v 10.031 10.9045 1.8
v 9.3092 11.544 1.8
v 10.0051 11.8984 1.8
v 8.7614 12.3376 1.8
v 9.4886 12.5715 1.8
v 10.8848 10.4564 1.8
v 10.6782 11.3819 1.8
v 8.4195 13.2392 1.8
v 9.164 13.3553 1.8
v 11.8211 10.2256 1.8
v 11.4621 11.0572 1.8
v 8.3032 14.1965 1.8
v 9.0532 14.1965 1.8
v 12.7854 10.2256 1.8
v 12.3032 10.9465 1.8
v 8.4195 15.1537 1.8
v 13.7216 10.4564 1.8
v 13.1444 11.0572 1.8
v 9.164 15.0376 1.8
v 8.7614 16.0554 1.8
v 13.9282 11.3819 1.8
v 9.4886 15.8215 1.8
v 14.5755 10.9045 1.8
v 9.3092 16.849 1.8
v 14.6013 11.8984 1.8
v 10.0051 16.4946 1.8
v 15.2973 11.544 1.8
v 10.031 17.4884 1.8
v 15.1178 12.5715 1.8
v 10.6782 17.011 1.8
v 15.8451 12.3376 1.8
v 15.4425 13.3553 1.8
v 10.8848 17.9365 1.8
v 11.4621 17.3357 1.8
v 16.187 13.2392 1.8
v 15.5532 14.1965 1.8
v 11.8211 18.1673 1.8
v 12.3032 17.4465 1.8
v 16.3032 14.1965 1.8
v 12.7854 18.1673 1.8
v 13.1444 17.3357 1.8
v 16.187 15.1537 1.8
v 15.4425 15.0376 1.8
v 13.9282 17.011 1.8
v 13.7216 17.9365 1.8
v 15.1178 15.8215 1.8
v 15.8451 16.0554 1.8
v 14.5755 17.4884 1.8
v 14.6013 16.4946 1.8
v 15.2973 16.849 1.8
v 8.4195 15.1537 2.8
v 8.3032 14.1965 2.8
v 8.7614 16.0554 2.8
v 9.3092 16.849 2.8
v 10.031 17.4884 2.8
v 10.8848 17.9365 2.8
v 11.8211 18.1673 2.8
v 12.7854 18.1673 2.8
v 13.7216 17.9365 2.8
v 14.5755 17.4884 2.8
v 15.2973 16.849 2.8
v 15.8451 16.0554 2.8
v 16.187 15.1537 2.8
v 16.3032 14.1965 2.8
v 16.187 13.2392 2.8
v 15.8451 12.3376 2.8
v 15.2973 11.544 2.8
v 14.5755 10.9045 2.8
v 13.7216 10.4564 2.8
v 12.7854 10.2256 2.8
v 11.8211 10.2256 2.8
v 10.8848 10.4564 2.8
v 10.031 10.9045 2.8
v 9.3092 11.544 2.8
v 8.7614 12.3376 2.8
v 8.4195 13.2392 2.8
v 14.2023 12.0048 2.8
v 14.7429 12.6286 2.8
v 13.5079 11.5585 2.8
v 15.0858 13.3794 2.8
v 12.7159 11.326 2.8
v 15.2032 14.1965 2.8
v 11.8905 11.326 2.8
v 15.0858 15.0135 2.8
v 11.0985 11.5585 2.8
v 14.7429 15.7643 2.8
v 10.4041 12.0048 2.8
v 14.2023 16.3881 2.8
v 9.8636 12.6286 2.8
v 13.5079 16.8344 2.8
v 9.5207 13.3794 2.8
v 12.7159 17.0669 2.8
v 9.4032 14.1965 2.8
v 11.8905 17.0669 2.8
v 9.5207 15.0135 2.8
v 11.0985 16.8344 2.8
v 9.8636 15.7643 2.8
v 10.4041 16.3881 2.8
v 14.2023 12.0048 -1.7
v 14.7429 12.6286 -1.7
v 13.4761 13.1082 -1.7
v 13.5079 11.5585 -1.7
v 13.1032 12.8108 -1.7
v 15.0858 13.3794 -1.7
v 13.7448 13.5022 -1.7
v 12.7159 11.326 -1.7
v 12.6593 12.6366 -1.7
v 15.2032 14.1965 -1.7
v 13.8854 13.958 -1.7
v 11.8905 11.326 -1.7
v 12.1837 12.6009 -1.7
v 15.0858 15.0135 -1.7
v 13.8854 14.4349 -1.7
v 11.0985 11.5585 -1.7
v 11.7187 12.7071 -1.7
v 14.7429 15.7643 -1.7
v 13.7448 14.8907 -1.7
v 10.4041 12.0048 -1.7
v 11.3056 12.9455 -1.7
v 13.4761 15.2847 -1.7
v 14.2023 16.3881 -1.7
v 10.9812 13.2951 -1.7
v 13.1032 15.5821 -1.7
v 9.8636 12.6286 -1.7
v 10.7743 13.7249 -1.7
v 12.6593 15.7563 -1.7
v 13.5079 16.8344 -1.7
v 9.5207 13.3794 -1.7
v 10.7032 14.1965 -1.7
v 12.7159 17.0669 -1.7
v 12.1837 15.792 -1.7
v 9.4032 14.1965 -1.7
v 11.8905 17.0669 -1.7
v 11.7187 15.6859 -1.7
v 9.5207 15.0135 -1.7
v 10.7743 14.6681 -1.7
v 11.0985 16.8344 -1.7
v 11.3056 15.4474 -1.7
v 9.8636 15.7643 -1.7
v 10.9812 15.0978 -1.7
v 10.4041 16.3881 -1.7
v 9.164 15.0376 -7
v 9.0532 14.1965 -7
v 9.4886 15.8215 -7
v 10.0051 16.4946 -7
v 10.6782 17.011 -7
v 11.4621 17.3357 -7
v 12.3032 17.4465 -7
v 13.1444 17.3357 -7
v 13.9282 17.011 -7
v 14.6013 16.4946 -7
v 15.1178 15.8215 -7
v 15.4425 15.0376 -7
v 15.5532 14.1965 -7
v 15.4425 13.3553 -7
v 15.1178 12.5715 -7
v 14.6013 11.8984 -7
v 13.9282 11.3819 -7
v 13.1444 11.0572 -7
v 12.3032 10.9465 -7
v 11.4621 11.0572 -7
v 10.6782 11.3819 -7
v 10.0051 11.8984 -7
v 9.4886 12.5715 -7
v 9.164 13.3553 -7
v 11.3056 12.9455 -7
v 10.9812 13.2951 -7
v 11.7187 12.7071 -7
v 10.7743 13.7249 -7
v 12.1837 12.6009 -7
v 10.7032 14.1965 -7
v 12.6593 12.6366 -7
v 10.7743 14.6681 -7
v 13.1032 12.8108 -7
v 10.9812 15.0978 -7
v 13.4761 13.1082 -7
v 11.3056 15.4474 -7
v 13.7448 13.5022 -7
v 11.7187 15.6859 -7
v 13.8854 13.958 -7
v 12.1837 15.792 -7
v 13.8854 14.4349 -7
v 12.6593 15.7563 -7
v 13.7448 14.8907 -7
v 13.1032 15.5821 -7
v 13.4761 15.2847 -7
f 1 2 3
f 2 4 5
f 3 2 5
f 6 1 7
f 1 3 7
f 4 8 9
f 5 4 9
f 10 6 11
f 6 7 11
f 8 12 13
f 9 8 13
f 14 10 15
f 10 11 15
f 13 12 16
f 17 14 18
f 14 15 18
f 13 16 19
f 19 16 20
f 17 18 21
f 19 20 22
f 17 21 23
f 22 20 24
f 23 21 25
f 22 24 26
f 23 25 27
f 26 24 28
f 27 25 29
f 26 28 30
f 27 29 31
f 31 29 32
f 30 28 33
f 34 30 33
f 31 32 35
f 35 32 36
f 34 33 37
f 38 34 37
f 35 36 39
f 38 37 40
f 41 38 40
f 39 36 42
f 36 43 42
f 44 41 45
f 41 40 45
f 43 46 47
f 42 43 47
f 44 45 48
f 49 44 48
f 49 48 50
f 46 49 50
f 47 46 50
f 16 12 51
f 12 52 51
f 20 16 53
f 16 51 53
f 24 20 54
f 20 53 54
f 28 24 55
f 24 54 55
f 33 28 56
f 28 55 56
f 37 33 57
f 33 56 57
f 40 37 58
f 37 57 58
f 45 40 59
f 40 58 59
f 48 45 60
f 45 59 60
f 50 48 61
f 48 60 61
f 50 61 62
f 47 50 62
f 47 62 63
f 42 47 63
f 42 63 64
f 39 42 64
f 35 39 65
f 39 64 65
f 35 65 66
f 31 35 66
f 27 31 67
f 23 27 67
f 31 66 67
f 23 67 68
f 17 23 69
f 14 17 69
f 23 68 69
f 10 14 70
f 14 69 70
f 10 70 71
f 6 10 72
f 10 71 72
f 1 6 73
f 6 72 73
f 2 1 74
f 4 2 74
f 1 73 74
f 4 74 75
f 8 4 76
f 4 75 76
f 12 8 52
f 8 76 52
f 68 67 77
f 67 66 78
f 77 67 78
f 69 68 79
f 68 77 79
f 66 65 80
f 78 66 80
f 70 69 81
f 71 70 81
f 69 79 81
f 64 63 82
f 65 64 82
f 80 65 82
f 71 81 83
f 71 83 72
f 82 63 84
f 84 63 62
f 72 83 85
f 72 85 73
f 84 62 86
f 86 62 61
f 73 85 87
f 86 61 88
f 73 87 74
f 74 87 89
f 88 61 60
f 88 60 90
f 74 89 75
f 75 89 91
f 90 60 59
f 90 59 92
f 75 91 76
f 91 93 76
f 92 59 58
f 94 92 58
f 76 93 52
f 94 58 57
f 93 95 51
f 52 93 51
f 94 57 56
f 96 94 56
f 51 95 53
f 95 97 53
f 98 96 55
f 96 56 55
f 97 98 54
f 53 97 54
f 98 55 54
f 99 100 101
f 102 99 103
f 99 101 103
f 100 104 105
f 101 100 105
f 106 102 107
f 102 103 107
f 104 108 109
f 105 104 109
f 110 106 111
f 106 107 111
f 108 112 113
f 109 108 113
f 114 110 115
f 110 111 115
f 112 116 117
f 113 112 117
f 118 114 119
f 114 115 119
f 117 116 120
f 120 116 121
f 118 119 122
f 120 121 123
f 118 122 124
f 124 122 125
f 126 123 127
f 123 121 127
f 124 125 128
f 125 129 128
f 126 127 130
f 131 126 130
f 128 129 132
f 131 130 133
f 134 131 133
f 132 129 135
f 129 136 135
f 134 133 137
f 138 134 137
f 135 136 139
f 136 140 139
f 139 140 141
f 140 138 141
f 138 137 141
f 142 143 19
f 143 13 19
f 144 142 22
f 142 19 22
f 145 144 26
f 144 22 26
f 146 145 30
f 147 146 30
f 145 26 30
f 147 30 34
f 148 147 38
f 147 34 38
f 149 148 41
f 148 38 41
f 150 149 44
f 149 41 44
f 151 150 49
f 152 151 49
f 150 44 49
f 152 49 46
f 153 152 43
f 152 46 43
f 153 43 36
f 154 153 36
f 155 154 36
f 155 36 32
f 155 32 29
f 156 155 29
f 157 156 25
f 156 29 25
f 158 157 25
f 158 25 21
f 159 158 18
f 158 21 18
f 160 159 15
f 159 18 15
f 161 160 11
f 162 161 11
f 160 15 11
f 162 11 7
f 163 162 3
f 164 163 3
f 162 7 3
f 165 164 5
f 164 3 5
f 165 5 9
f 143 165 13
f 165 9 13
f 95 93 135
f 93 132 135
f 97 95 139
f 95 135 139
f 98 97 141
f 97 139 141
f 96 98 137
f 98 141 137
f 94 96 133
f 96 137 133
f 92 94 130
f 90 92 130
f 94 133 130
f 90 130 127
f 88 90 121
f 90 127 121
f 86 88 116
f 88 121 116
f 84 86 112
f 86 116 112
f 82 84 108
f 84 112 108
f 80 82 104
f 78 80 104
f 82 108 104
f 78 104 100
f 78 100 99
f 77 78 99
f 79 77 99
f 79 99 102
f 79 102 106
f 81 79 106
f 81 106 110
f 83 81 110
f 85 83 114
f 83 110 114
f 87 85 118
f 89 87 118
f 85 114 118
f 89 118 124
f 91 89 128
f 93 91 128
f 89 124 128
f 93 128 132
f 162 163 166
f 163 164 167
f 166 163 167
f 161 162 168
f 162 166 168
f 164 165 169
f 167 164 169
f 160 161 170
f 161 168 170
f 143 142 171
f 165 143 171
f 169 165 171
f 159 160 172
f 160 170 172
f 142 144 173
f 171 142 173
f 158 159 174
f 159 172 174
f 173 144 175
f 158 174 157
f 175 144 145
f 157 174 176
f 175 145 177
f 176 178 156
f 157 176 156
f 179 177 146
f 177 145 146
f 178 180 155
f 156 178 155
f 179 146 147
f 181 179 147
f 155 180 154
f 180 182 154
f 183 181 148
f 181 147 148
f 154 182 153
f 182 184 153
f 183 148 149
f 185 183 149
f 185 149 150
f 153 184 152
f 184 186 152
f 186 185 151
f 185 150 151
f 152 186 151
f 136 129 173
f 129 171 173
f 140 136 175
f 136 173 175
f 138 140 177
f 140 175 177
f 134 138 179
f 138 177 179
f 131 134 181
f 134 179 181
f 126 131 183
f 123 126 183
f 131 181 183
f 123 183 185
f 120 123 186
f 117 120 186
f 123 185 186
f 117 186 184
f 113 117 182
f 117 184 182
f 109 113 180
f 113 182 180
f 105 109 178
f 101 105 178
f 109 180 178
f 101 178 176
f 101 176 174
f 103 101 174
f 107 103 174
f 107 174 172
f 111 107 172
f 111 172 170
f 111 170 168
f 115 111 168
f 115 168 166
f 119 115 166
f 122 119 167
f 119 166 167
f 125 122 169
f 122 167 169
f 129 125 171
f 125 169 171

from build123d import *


with BuildPart() as part:
    # Sketch1 → Revolve1 (revolve)
    with BuildSketch(Plane.XZ.offset(-14.196461829), mode=Mode.PRIVATE) as revolve1_sk:
        Polygon((13.903227856, -1.7), (13.903227856, -7), (15.553227856, -7), (15.553227856, 1.8), (16.303227856, 1.8), (16.303227856, 2.8), (15.203227856, 2.8), (15.203227856, -1.7), align=None)
    revolve(revolve1_sk.sketch.rotate(Axis((12.303227856, 14.196461829, 5), (0, 0, -1)), 180), axis=Axis((12.303227856, 14.196461829, 5), (0, 0, -1)))


solid = part.part
